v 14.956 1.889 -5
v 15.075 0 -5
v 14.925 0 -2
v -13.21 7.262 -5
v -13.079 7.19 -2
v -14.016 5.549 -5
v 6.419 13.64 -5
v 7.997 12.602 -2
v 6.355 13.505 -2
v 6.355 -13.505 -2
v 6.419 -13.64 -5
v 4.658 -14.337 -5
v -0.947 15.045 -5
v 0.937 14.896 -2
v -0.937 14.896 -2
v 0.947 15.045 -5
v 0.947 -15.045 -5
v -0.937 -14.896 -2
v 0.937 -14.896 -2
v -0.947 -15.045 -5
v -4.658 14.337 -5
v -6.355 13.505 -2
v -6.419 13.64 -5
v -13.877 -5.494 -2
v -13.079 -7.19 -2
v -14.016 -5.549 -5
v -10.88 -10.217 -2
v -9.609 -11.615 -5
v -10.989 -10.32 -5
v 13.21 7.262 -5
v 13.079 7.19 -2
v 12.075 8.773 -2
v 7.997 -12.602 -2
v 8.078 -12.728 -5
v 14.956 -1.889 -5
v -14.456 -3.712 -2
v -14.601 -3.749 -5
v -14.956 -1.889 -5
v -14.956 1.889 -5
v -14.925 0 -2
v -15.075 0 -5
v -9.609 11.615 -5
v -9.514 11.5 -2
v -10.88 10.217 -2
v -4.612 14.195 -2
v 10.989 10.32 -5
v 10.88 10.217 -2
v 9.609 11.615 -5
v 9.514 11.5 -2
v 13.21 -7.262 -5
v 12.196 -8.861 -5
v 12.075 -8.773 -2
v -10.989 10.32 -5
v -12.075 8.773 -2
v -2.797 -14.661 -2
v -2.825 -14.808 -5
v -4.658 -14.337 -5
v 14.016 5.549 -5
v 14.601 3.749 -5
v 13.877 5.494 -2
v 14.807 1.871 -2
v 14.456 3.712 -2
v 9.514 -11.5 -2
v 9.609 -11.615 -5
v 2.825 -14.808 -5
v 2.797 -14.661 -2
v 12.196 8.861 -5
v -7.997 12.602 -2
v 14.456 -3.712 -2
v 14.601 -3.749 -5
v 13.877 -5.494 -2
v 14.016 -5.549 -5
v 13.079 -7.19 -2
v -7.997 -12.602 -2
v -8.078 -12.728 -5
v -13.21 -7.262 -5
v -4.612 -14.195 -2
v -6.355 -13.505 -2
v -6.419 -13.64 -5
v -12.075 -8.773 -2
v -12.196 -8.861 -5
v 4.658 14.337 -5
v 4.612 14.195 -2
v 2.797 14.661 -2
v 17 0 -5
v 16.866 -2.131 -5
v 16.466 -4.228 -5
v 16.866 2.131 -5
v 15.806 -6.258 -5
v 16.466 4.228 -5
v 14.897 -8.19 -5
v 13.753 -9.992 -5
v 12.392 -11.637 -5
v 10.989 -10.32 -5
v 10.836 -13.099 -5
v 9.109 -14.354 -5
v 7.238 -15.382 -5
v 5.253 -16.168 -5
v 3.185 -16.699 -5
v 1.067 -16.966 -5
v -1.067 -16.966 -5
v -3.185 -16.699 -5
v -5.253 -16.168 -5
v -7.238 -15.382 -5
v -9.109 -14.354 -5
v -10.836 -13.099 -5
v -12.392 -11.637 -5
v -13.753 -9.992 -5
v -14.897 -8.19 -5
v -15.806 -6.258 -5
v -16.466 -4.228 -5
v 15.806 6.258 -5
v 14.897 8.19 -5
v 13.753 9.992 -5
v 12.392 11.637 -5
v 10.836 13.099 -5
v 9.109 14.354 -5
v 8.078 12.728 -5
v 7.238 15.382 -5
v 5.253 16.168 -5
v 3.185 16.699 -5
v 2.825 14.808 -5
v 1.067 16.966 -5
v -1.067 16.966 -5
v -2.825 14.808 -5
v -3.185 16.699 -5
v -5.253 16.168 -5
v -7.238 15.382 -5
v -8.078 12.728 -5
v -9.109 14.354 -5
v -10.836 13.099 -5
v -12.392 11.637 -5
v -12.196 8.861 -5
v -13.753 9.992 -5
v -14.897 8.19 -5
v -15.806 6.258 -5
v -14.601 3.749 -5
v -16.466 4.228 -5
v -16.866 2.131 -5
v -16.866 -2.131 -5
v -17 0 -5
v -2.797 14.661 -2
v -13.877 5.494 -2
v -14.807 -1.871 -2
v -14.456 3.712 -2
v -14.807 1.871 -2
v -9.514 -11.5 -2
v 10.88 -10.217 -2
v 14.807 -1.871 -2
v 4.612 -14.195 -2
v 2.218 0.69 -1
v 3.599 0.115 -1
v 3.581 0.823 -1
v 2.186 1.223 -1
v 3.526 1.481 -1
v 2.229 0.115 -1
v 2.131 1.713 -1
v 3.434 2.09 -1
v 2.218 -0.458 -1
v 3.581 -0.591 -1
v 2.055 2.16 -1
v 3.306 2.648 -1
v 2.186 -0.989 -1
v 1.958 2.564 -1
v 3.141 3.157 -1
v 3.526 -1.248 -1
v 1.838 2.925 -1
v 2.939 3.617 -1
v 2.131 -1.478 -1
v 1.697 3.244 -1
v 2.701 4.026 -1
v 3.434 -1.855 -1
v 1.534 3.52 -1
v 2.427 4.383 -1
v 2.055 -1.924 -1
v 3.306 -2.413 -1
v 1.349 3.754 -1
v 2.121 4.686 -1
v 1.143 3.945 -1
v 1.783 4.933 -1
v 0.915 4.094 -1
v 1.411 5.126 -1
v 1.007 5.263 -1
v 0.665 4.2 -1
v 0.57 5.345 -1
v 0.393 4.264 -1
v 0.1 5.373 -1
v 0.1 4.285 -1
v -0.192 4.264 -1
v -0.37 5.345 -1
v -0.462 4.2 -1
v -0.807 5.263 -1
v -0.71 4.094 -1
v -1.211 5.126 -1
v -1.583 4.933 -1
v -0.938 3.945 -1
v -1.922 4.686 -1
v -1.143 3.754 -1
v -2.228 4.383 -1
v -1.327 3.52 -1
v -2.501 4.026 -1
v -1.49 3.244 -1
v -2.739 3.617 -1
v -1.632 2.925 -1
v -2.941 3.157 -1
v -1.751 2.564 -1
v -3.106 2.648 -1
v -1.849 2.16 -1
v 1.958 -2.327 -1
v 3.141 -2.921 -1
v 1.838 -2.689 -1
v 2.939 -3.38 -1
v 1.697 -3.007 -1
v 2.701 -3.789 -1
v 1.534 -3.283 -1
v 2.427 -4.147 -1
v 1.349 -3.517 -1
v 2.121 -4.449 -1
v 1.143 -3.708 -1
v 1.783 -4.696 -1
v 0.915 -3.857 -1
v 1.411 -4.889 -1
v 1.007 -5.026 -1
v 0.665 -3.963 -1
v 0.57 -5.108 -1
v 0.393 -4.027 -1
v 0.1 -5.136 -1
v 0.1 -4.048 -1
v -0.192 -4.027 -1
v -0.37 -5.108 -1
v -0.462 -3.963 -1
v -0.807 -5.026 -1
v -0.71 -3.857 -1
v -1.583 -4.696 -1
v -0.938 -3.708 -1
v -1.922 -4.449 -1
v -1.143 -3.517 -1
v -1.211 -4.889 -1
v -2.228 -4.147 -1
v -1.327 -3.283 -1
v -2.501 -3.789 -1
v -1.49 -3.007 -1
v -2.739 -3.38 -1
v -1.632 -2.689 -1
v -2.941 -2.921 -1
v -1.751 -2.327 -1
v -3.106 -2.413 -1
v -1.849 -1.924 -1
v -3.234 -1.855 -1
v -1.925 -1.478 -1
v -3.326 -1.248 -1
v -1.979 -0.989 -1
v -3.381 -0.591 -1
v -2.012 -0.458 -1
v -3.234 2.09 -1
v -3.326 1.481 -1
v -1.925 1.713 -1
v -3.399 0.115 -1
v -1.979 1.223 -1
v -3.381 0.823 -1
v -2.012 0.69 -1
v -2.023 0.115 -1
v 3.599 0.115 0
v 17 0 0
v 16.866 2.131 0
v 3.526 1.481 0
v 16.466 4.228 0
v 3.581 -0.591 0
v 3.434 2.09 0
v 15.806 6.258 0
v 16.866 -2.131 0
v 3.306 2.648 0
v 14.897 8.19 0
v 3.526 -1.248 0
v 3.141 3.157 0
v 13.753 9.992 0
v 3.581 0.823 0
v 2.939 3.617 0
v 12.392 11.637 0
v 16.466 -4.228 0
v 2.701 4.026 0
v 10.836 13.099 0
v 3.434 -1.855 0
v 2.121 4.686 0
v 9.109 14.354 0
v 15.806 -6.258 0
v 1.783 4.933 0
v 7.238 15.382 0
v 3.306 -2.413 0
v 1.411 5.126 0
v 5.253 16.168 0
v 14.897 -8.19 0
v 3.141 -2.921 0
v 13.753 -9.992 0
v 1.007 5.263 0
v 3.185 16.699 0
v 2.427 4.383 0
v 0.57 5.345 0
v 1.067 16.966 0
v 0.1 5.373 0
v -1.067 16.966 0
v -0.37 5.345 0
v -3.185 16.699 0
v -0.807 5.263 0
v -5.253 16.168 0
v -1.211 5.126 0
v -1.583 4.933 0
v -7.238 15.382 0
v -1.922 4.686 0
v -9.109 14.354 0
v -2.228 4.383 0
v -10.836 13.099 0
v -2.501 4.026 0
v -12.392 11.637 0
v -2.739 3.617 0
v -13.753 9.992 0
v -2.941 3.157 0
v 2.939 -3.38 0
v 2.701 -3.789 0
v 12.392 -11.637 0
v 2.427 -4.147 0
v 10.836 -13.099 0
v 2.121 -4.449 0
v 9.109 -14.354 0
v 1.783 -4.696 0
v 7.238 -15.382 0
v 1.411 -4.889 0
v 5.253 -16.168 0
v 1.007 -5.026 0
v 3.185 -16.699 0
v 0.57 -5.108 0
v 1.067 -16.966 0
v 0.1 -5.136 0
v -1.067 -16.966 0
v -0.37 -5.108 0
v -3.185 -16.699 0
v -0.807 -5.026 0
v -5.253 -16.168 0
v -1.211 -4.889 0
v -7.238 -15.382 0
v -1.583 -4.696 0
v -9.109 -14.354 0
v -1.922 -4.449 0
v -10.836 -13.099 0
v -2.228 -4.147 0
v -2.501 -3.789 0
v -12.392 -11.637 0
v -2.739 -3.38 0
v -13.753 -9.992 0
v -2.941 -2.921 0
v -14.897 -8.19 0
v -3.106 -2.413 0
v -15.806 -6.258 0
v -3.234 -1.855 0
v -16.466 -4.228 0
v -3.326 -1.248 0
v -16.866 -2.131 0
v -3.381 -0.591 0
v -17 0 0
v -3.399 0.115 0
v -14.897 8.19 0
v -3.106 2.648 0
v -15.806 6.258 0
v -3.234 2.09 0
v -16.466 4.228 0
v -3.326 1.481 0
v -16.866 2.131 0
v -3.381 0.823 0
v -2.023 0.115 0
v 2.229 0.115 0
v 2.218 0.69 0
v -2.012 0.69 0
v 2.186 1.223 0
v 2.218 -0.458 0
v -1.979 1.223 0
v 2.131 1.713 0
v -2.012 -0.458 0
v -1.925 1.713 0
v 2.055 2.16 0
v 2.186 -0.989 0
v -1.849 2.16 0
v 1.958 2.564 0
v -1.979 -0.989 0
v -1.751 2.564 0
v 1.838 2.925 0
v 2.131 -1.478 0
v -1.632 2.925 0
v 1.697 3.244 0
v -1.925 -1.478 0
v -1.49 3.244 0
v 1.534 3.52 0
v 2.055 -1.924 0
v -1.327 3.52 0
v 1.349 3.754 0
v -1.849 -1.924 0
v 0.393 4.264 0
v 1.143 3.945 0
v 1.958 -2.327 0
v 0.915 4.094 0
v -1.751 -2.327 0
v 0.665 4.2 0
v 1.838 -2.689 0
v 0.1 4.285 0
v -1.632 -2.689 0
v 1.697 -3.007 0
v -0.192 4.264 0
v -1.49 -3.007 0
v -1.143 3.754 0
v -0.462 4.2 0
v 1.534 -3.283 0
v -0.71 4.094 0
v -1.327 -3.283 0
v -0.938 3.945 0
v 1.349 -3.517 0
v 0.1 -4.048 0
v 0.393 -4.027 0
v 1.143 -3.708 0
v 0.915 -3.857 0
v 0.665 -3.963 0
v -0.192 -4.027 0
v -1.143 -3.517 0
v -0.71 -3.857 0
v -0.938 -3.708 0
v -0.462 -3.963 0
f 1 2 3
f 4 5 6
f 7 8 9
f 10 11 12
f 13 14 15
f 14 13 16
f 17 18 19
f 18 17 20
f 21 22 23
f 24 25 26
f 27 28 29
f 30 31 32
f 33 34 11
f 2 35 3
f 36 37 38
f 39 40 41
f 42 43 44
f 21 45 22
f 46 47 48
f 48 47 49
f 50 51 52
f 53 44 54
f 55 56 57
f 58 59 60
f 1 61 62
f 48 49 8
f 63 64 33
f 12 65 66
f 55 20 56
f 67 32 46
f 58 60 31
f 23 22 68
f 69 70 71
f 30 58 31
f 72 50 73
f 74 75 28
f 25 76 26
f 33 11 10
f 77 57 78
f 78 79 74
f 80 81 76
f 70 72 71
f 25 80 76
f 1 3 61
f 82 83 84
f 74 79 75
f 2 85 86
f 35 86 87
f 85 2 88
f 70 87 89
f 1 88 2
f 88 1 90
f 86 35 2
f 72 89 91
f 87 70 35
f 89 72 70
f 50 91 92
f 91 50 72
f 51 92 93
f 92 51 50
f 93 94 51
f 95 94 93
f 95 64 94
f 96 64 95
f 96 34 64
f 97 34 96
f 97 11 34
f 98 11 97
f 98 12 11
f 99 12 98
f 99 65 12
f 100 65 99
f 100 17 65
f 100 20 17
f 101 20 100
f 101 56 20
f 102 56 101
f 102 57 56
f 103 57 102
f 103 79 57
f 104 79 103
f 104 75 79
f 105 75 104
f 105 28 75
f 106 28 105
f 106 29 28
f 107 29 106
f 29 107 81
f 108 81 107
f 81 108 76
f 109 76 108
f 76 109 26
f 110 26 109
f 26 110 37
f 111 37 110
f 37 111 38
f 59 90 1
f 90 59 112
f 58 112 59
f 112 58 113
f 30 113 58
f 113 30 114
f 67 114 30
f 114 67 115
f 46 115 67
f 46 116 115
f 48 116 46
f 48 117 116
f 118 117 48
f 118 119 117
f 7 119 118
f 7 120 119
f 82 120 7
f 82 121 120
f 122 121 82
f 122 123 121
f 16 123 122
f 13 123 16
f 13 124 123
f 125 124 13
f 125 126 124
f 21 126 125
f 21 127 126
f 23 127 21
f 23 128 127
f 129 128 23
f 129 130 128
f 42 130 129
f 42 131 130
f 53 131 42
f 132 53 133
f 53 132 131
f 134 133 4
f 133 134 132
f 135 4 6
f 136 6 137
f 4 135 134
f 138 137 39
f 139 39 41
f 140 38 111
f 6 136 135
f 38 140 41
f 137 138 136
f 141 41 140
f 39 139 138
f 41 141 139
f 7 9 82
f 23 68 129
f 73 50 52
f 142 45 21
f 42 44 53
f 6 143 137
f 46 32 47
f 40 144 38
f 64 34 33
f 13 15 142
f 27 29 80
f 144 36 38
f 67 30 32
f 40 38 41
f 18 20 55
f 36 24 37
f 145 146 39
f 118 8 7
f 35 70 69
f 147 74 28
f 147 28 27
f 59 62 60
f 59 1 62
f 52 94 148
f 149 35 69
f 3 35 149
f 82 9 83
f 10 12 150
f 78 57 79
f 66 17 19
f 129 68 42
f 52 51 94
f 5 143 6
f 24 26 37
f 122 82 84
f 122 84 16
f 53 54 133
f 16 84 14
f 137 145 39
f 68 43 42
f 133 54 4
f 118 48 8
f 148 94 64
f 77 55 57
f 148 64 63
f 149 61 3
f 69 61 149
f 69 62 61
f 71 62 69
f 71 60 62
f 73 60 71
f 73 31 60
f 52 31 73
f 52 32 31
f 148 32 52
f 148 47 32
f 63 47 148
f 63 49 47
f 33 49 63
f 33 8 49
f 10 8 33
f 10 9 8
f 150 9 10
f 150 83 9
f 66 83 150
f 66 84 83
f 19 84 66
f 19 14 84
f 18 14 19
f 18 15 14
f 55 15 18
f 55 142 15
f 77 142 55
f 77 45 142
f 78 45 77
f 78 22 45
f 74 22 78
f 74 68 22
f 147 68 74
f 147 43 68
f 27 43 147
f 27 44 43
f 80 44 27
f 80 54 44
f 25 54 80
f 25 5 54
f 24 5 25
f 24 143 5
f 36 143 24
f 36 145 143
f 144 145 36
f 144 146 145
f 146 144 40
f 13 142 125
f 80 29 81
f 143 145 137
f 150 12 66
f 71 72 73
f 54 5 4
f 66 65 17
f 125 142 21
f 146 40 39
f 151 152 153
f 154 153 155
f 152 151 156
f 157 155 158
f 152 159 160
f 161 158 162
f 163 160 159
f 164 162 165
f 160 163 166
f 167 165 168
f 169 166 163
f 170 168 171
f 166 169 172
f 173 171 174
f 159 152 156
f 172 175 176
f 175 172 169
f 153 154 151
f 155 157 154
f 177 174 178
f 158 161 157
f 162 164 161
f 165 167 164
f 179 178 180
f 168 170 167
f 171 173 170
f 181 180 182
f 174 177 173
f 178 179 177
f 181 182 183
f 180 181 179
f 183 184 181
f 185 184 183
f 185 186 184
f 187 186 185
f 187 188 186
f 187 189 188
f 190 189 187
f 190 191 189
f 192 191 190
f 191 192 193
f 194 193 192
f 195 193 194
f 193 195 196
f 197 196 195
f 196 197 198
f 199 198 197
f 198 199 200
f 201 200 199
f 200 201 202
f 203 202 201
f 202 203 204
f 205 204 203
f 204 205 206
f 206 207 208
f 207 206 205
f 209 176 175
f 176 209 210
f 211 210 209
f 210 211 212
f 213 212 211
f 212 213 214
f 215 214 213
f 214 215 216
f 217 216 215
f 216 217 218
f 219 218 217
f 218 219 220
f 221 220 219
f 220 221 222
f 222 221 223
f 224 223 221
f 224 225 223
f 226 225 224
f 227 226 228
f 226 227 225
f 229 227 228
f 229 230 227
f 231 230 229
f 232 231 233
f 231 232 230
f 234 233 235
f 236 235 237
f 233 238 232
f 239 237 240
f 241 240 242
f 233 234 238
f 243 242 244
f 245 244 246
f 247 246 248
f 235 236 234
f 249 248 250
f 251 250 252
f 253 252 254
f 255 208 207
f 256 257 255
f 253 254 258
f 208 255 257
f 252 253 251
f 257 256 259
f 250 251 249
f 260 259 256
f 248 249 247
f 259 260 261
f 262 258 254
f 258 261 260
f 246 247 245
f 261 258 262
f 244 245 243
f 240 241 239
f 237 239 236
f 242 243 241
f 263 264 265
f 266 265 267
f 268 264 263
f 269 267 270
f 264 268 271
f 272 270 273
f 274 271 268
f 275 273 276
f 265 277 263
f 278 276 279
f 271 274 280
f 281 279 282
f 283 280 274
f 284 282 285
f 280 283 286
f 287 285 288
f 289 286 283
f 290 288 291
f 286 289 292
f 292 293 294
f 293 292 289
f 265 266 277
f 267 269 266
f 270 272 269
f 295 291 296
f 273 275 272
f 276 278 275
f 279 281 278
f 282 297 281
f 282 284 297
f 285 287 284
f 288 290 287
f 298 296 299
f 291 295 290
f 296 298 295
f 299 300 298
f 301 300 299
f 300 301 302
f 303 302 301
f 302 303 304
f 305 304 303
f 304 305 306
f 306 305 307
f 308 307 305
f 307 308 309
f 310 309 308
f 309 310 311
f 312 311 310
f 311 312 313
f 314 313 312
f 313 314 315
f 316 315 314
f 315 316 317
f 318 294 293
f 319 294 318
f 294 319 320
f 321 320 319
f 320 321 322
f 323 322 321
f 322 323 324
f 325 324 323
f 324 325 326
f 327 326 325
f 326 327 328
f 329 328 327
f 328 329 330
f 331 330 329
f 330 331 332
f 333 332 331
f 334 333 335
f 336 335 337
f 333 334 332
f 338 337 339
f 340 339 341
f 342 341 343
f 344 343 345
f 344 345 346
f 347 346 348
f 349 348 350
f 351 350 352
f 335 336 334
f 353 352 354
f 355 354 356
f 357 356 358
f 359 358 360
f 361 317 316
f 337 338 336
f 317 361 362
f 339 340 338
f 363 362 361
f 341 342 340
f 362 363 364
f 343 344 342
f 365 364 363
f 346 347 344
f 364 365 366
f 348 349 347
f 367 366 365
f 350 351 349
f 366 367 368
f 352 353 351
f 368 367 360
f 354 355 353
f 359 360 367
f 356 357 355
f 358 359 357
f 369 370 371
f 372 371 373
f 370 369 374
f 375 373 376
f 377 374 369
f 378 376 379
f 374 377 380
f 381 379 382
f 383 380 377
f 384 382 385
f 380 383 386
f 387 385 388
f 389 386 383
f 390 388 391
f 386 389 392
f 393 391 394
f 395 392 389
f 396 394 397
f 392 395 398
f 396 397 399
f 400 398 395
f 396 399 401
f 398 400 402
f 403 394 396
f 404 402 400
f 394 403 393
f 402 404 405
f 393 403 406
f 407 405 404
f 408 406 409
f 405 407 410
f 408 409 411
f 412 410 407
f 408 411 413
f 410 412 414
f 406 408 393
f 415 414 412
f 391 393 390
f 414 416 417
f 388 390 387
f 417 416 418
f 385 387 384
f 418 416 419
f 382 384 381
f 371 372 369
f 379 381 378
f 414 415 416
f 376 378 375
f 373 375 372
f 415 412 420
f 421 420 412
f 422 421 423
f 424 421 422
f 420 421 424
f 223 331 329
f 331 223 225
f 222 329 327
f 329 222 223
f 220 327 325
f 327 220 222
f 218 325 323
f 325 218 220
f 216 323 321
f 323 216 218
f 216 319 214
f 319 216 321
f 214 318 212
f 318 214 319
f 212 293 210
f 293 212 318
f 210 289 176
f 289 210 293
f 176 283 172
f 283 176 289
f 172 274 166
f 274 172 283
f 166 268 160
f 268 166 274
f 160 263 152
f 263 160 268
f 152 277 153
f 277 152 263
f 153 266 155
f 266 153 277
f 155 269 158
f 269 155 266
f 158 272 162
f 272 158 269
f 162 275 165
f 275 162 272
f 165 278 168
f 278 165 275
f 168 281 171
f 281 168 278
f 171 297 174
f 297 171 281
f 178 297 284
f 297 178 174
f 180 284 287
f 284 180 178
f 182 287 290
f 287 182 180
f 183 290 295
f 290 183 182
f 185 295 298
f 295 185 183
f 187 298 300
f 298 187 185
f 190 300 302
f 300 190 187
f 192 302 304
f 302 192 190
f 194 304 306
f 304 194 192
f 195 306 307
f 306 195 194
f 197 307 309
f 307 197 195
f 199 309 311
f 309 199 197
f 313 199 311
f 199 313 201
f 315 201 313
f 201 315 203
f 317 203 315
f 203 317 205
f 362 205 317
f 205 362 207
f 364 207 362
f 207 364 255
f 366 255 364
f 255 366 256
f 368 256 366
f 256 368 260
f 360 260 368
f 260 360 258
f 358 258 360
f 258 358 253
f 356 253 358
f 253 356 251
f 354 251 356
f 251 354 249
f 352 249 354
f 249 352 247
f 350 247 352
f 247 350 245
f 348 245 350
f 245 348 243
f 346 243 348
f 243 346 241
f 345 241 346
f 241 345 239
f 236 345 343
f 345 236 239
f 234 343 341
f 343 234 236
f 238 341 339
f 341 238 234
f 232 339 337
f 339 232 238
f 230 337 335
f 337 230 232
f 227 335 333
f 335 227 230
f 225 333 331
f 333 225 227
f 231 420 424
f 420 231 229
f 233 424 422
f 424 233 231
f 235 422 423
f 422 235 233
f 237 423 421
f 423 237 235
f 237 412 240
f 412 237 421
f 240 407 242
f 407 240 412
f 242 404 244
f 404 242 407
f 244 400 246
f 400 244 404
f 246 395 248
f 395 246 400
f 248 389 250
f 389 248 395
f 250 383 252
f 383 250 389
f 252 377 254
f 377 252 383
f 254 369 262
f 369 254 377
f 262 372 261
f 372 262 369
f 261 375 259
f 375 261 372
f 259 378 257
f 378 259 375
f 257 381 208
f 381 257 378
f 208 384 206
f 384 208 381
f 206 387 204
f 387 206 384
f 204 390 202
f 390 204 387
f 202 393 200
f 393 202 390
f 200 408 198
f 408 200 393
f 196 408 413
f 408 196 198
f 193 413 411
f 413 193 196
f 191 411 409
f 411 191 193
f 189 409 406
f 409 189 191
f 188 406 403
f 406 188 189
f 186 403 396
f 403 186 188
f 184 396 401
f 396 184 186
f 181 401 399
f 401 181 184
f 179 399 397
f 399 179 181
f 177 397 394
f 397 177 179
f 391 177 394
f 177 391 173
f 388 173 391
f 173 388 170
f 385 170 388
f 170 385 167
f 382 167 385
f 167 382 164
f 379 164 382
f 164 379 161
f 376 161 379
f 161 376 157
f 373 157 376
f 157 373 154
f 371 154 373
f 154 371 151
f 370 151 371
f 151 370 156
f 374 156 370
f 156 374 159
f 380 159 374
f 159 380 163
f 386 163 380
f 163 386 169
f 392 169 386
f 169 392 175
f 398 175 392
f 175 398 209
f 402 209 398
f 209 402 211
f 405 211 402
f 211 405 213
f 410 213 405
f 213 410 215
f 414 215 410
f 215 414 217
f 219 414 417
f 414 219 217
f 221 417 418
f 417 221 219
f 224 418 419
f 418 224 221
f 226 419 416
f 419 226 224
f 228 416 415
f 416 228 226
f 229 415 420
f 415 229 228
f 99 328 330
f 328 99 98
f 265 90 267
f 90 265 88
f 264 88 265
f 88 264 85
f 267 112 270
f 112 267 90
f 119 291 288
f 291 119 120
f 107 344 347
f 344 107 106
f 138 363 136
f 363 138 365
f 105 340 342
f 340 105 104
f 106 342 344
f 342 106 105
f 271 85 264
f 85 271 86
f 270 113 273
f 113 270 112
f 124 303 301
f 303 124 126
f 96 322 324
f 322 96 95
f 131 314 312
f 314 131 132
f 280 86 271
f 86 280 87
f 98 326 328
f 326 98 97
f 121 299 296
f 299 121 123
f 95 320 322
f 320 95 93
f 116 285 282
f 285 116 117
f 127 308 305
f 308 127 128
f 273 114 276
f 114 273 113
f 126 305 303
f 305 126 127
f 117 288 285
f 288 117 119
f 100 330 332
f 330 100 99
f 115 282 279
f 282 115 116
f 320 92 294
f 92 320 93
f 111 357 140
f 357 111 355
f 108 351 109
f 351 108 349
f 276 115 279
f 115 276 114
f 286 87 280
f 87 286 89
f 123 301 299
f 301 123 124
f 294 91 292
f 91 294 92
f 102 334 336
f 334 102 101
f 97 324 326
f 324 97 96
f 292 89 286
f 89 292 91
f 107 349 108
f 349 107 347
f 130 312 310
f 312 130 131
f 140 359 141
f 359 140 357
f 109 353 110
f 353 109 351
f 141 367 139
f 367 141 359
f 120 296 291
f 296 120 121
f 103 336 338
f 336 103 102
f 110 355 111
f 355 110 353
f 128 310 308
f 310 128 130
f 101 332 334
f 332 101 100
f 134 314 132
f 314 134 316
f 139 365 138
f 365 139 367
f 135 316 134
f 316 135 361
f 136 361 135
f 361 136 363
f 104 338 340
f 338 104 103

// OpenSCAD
$fn = 50;

difference() {
	union() {
		translate(v = [0, 0, -5.0]) {
			cylinder(h = 5, r = 17.0);
		}
	}
	union() {
		#translate(v = [0, 0, -5.0]) {
			cylinder(h = 3, r1 = 15.075, r2 = 14.925);
		}
		translate(v = [0, 0, -1]) {
			linear_extrude(height = 1) {
				text(font = "Impact", halign = "center", size = 10, text = "0", valign = "center");
			}
		}
	}
}
